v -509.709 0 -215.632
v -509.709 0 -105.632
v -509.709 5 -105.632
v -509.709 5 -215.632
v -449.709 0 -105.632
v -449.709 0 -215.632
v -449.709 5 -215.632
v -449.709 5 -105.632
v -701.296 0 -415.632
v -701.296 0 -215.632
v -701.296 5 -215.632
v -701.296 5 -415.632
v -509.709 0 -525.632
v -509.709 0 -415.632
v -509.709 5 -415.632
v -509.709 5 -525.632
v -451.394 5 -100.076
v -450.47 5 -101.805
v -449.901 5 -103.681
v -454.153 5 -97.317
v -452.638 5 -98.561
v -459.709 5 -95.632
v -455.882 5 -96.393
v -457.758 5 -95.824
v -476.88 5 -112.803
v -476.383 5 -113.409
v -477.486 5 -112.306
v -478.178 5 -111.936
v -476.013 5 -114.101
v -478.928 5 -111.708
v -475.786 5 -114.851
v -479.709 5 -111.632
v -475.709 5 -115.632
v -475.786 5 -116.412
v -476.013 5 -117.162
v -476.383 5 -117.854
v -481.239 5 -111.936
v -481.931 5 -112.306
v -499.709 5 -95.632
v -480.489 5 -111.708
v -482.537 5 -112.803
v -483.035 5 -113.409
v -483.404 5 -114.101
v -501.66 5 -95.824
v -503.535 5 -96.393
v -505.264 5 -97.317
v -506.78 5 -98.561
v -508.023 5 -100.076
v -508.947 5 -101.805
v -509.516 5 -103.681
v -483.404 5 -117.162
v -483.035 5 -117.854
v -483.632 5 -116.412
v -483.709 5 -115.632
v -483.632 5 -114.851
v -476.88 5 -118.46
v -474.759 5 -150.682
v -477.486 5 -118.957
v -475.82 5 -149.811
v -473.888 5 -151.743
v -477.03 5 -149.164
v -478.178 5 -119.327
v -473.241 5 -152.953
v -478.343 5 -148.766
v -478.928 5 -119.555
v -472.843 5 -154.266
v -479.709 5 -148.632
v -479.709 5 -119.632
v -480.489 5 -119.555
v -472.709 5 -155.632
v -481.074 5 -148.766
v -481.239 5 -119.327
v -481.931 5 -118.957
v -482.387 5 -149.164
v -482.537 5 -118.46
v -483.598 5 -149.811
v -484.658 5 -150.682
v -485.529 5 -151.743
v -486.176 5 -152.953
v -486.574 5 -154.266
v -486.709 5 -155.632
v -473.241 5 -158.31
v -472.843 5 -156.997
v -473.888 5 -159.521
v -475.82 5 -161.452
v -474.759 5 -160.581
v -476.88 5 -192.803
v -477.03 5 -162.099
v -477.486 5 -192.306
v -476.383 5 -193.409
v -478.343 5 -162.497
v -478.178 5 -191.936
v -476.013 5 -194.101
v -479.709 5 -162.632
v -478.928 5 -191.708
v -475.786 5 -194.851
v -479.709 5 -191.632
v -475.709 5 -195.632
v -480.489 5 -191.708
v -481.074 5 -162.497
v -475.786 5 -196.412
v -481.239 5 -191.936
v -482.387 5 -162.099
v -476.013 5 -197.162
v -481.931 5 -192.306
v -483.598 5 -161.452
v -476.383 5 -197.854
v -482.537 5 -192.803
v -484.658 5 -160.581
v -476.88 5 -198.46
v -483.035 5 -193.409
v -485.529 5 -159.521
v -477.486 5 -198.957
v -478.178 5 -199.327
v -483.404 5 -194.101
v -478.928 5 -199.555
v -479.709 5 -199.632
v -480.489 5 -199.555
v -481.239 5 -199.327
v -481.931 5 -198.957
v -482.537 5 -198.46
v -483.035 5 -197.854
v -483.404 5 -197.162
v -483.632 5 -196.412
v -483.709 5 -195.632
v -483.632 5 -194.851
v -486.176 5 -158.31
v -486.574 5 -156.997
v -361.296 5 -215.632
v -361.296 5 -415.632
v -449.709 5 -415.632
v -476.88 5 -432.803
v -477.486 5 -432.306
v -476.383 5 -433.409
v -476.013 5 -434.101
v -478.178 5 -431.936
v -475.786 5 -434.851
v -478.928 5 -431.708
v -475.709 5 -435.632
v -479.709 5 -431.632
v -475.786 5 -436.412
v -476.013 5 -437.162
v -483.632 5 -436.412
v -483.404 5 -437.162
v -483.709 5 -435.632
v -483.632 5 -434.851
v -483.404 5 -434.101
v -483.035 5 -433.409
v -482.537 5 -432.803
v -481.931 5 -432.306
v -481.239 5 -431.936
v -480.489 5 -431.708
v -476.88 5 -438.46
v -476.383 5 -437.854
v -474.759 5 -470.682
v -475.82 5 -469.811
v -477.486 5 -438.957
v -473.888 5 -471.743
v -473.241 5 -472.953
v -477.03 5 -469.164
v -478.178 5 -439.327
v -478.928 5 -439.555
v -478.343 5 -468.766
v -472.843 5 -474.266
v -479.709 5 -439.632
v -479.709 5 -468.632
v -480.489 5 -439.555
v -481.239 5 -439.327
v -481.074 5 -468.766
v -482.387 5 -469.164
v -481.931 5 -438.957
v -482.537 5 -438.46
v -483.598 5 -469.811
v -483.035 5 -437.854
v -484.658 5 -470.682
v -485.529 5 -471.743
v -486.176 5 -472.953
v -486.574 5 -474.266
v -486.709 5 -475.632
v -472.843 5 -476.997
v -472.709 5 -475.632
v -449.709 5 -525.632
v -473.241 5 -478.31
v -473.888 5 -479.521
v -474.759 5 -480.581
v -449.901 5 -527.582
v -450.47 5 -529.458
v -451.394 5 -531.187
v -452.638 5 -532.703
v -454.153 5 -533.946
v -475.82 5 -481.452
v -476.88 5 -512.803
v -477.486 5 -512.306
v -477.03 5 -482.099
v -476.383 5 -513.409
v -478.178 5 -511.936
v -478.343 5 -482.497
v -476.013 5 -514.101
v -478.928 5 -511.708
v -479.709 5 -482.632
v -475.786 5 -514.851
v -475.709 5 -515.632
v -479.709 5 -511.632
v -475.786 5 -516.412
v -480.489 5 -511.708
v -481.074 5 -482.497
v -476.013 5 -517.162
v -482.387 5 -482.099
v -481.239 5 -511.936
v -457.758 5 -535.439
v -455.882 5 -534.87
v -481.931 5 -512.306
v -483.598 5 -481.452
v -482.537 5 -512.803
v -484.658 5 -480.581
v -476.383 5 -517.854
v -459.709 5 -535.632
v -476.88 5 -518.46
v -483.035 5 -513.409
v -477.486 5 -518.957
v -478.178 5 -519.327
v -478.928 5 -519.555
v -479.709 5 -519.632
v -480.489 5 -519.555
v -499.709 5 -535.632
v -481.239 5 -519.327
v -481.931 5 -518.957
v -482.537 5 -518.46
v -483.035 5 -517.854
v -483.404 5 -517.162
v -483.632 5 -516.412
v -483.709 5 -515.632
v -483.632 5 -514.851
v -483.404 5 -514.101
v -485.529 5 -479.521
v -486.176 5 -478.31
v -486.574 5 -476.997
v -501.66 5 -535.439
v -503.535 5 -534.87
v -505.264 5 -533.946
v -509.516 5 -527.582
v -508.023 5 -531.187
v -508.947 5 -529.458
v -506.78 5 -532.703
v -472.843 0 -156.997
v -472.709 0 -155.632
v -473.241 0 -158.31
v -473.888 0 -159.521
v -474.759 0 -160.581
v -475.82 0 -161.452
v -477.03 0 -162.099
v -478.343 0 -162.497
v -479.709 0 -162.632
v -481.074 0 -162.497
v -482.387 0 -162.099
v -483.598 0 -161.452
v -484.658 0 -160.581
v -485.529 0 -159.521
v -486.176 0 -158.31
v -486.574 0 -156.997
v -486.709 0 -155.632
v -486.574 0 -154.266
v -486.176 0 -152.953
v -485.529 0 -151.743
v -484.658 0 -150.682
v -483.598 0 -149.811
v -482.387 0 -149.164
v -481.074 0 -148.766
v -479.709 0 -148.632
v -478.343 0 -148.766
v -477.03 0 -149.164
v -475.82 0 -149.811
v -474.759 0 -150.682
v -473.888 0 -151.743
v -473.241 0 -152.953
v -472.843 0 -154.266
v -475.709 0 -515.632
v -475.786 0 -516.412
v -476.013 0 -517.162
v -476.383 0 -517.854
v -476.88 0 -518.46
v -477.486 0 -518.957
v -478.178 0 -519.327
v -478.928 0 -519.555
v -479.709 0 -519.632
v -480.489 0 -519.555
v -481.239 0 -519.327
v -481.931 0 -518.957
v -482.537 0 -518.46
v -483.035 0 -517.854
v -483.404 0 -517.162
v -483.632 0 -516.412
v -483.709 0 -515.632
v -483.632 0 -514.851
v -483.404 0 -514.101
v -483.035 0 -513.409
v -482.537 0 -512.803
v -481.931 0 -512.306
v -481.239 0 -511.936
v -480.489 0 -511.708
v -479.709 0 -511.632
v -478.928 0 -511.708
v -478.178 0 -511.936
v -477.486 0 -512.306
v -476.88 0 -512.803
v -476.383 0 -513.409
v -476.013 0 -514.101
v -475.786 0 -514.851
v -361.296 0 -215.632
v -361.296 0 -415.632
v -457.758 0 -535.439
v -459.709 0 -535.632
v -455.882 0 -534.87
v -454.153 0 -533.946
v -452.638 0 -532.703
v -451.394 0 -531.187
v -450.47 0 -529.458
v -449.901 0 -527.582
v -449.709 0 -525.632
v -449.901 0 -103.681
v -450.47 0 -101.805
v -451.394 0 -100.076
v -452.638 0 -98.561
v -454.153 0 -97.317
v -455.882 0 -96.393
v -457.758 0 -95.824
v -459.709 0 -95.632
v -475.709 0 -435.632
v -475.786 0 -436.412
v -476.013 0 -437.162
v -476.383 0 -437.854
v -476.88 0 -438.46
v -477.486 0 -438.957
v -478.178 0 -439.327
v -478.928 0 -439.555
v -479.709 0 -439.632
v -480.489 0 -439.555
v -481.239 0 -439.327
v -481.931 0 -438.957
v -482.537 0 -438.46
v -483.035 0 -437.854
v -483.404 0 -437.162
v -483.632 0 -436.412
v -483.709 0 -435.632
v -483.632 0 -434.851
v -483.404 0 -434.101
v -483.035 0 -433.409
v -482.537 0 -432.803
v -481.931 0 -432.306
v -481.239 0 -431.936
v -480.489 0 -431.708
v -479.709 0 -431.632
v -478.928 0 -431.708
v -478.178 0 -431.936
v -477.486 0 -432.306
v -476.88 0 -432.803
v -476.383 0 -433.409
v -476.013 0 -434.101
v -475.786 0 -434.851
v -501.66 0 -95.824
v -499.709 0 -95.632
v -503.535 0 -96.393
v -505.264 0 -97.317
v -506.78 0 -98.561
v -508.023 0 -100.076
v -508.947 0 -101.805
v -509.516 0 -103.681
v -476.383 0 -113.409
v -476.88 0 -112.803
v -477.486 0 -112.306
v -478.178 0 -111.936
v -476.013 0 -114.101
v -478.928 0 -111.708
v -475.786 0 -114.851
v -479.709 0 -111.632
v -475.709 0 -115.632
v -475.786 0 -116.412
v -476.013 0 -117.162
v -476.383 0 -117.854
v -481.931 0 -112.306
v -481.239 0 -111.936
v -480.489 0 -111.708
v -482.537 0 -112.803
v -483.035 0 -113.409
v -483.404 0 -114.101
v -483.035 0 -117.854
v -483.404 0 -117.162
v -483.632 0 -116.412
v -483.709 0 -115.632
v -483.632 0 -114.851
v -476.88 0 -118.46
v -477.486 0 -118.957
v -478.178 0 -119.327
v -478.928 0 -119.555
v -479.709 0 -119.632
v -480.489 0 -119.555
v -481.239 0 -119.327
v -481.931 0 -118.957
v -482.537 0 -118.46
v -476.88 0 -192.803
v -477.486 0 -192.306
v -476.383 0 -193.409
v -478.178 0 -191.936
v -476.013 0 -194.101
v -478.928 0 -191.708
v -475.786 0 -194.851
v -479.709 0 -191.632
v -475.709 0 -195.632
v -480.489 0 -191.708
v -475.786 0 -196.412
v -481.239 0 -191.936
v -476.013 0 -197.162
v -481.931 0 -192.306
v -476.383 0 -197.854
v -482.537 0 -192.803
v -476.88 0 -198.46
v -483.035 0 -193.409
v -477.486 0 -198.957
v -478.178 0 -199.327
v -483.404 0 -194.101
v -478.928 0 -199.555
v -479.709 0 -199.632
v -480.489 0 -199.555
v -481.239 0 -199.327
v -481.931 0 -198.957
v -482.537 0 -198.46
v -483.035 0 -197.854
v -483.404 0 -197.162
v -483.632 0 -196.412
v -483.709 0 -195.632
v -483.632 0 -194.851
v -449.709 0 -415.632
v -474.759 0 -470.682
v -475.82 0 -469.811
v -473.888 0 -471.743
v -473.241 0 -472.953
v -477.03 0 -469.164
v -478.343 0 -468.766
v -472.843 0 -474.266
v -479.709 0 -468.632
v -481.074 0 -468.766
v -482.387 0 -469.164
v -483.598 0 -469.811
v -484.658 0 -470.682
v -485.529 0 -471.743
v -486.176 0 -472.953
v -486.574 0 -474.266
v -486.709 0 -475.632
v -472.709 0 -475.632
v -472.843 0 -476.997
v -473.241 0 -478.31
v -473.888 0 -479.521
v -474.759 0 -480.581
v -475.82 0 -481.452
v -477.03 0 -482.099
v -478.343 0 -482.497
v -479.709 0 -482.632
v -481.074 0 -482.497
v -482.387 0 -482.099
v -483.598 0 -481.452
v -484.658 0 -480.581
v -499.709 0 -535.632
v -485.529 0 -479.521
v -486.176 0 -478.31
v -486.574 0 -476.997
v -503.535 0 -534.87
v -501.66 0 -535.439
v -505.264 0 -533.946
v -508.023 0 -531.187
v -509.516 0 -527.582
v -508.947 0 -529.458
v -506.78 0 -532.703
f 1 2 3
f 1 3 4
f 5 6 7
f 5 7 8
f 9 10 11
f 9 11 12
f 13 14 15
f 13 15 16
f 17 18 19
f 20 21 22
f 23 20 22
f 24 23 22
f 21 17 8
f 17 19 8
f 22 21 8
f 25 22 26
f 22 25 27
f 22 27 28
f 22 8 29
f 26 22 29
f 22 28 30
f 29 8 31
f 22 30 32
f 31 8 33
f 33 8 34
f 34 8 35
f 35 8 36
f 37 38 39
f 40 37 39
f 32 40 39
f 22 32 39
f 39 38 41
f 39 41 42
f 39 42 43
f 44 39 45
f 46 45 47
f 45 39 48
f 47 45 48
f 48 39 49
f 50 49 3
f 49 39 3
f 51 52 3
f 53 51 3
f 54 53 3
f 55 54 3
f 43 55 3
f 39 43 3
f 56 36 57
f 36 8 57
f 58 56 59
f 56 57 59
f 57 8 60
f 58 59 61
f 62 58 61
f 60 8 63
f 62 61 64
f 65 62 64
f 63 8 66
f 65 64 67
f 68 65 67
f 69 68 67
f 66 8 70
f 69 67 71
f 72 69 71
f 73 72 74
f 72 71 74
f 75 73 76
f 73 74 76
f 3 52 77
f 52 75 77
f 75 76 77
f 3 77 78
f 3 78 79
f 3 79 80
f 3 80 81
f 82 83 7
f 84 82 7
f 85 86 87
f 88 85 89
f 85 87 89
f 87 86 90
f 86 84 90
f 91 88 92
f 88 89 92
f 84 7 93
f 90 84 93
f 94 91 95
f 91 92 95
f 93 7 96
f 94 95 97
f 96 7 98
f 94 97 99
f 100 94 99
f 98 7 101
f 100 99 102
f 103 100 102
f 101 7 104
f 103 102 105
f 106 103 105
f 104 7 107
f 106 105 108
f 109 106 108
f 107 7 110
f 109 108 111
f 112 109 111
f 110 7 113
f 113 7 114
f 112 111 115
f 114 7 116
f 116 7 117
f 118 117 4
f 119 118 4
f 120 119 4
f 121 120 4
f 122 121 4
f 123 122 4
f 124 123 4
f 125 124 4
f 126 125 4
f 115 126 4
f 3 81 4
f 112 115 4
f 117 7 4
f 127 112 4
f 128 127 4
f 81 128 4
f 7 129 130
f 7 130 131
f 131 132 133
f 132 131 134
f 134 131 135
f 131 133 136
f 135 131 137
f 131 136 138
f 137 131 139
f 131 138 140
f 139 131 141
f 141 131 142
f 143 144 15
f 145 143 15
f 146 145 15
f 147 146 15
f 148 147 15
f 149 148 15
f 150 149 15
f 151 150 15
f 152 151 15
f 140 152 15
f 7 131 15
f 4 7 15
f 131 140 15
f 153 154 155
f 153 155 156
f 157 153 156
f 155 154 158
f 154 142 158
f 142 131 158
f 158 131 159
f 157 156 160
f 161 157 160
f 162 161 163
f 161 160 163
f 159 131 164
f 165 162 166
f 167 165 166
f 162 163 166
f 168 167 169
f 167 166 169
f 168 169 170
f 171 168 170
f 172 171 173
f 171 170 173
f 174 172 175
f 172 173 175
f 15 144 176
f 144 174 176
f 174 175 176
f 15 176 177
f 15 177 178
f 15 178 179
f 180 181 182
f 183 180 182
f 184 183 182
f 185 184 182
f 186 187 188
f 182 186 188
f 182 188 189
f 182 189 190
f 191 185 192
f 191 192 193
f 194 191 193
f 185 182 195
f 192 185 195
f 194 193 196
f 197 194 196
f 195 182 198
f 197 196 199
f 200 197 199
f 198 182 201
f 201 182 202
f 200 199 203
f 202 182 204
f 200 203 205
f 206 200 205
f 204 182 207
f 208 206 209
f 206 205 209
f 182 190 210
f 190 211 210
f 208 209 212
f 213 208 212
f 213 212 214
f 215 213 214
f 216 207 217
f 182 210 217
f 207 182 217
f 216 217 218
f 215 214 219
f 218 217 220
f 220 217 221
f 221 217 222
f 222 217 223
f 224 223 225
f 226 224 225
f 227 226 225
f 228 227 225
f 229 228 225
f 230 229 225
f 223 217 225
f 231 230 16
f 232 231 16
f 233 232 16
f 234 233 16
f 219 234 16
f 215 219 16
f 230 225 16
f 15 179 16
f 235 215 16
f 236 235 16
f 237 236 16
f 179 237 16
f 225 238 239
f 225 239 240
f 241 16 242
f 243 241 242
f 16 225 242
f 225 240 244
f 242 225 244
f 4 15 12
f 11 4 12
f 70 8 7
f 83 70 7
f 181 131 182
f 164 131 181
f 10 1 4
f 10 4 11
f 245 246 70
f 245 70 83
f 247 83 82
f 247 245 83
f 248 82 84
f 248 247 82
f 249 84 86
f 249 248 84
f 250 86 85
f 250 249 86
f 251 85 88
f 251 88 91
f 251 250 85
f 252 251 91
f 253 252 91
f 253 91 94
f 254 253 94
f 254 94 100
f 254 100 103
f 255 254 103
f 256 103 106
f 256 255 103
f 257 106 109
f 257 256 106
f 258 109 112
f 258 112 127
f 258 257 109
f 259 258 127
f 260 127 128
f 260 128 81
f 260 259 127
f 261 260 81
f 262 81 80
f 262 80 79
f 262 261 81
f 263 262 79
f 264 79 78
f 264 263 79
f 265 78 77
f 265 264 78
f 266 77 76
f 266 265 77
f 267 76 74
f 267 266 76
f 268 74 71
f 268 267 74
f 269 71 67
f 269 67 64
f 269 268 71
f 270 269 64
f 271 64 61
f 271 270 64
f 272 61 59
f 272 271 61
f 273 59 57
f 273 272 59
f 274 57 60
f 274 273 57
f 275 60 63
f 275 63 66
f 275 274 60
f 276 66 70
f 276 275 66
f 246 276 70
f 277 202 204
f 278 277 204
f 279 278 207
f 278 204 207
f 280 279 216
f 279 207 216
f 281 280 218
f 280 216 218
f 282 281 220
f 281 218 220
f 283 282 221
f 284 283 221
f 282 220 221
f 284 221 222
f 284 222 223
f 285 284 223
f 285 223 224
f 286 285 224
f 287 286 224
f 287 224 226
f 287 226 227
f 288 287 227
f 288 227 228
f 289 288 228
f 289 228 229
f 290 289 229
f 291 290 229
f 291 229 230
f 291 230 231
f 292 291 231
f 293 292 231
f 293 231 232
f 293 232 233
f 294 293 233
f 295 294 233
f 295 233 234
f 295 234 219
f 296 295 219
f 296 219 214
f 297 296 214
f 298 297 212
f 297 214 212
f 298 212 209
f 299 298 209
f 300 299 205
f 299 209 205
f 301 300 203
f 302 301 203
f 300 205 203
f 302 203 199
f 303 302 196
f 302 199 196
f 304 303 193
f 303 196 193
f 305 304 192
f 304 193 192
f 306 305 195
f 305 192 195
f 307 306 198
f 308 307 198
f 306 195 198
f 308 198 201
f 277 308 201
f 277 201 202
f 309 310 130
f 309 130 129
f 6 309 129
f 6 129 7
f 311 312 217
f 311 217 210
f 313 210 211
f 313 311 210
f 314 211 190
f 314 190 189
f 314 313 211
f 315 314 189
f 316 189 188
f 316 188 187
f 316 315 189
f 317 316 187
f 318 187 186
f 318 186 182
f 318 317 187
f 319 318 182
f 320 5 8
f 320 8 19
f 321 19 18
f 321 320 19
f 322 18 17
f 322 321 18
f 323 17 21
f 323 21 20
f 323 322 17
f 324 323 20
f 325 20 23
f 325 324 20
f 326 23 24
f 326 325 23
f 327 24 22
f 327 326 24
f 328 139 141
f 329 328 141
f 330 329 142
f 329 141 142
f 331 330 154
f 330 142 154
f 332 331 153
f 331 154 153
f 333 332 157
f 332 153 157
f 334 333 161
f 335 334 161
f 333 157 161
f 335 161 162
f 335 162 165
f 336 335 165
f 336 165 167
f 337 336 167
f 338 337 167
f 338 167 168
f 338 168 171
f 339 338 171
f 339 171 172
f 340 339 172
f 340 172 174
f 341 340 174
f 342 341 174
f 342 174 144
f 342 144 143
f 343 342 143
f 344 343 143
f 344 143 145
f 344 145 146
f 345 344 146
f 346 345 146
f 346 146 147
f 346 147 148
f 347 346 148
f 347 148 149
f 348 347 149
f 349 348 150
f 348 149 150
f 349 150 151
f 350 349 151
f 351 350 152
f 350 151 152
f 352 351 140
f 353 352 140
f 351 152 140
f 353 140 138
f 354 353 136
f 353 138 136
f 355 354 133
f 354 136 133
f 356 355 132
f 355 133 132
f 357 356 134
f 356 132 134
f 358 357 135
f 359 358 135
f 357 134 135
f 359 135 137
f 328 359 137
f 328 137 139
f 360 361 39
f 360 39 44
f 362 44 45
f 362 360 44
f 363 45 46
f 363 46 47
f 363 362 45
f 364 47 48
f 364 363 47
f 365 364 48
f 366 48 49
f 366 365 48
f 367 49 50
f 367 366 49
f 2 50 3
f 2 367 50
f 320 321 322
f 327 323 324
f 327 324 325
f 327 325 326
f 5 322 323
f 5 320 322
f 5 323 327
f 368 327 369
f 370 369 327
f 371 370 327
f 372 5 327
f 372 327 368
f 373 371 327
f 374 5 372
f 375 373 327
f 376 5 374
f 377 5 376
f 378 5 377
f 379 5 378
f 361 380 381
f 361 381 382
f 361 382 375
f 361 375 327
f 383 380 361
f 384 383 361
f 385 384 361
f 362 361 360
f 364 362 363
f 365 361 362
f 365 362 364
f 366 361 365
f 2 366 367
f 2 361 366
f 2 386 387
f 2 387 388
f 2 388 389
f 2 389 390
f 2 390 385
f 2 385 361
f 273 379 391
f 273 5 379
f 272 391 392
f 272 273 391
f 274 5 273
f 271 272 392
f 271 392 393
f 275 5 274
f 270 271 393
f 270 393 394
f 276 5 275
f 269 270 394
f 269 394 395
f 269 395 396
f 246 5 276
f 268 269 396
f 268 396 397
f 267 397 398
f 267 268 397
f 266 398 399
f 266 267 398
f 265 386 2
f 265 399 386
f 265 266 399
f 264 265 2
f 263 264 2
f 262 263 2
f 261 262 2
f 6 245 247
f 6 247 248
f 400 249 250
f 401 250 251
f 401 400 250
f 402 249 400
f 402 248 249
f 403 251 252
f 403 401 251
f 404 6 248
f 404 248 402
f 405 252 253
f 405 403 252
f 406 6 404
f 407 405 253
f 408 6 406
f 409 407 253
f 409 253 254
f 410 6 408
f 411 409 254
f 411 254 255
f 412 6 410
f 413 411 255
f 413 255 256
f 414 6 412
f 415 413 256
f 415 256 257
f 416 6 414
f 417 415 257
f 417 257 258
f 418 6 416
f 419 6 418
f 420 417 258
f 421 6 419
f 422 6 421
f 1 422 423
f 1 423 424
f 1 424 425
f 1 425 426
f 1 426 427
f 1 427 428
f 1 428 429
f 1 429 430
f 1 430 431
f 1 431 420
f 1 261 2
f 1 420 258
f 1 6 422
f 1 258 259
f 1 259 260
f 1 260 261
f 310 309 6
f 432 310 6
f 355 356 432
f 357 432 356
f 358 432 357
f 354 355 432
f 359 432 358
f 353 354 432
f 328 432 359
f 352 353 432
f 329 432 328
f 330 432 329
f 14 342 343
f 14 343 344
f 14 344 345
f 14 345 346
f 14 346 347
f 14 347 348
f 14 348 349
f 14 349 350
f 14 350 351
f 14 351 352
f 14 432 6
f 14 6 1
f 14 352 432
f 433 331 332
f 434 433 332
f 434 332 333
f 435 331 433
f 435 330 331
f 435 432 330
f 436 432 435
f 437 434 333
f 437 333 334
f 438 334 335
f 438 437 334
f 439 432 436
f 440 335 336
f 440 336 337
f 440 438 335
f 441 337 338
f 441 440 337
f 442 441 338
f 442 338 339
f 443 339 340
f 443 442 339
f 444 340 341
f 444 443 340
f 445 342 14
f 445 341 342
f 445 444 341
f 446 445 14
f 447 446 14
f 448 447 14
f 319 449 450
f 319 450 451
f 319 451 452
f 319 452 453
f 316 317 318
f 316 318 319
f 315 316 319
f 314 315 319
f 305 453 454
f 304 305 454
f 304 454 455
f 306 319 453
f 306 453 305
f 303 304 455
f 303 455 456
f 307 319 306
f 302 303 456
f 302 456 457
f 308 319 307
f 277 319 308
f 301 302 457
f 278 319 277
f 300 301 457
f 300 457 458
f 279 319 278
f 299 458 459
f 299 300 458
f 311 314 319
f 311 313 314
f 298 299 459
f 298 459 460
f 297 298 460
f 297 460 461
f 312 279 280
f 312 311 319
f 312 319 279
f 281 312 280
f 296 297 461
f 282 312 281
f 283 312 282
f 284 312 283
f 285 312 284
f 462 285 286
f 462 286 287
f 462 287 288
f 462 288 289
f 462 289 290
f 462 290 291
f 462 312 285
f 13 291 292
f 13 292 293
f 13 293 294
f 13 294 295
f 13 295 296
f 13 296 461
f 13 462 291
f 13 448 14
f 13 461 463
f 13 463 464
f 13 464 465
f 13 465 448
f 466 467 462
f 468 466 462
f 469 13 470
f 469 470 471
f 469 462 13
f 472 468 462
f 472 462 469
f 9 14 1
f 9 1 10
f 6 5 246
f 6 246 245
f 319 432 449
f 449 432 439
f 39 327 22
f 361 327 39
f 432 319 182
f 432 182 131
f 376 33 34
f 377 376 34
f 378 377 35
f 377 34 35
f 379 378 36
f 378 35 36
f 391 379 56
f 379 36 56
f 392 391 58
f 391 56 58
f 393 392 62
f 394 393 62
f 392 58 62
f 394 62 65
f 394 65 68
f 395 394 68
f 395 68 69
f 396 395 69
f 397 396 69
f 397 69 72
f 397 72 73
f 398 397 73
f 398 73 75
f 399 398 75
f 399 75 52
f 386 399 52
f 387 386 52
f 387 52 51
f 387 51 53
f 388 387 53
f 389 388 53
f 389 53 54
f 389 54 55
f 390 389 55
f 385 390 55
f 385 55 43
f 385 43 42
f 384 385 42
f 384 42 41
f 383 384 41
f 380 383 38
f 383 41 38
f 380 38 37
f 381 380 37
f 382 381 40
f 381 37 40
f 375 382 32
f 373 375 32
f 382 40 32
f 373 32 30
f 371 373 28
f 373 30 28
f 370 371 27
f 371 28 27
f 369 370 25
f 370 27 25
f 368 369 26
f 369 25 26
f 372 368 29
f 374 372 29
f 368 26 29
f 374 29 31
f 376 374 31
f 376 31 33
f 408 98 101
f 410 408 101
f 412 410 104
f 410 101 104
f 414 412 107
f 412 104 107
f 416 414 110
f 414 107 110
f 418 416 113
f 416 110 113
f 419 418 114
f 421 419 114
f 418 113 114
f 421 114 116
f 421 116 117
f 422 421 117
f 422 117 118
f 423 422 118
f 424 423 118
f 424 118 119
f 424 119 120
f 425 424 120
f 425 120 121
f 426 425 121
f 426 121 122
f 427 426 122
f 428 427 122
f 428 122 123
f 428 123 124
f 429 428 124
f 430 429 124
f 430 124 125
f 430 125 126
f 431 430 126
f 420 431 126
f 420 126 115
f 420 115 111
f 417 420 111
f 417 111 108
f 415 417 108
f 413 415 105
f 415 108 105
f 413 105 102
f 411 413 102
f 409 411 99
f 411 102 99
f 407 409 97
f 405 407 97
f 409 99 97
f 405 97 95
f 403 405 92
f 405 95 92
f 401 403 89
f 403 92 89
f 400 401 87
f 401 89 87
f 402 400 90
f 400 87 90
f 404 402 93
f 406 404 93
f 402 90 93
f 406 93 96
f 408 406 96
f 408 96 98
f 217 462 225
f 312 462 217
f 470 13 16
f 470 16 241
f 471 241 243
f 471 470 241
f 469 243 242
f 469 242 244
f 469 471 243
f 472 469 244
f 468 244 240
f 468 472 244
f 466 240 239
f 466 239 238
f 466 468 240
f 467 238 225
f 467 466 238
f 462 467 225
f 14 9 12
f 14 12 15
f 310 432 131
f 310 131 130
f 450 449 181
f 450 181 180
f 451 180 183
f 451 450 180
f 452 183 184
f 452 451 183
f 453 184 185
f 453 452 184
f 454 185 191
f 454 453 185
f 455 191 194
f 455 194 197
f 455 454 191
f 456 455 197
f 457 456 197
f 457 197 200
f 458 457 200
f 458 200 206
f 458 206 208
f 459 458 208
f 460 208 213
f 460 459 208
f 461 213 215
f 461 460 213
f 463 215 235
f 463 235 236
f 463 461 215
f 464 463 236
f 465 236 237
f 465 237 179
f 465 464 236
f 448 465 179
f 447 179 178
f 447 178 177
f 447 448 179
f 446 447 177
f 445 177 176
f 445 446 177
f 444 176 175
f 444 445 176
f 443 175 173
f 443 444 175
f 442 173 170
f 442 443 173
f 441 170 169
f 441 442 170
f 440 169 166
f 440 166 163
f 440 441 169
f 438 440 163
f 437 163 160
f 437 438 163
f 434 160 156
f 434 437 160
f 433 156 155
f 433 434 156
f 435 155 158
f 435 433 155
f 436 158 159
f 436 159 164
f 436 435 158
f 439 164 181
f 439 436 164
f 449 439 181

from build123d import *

# Parameters (mm, degrees)
SKETCH1_R           = 7
BOSS_EXTRUDE1_DEPTH = 5
SKETCH2_R           = 4
CUT_EXTRUDE1_DEPTH  = 6


with BuildPart() as part:
    # Sketch1 → Boss-Extrude1 (new body)
    with BuildSketch(Plane(origin=(0, 0, 0), x_dir=(1, 0, 0), z_dir=(0, 1, 0))):
        with BuildLine():
            Line((-449.708642176, 415.631578947), (-361.296475424, 415.631578947))
            Line((-361.296475424, 415.631578947), (-361.296475424, 215.631578947))
            Line((-361.296475424, 215.631578947), (-449.708642176, 215.631578947))
            Line((-449.708642176, 215.631578947), (-449.708642176, 105.631578947))
            ThreePointArc((-449.708642176, 105.631578947), (-452.637574364, 98.560511136), (-459.708642176, 95.631578947))
            Line((-459.708642176, 95.631578947), (-499.708642176, 95.631578947))
            ThreePointArc((-499.708642176, 95.631578947), (-506.779709988, 98.560511136), (-509.708642176, 105.631578947))
            Line((-509.708642176, 105.631578947), (-509.708642176, 215.631578947))
            Line((-509.708642176, 215.631578947), (-701.296475424, 215.631578947))
            Line((-701.296475424, 215.631578947), (-701.296475424, 415.631578947))
            Line((-701.296475424, 415.631578947), (-509.708642176, 415.631578947))
            Line((-509.708642176, 415.631578947), (-509.708642176, 525.631578947))
            ThreePointArc((-509.708642176, 525.631578947), (-506.779709988, 532.702646759), (-499.708642176, 535.631578947))
            Line((-499.708642176, 535.631578947), (-459.708642176, 535.631578947))
            ThreePointArc((-459.708642176, 535.631578947), (-452.637574364, 532.702646759), (-449.708642176, 525.631578947))
            Line((-449.708642176, 525.631578947), (-449.708642176, 415.631578947))
        make_face()
        with Locations((-479.708642176, 475.631578947)):
            Circle(SKETCH1_R, mode=Mode.SUBTRACT)
        with Locations((-479.708642176, 155.631578947)):
            Circle(SKETCH1_R, mode=Mode.SUBTRACT)
    extrude(amount=BOSS_EXTRUDE1_DEPTH)

    # Sketch2 → Cut-Extrude1 (cut, through all)
    with BuildSketch(Plane(origin=(0, 5, 0), x_dir=(1, 0, 0), z_dir=(0, 1, 0))):
        with Locations((-479.708642176, 195.631578947)):
            Circle(SKETCH2_R)
        with Locations((-479.708642176, 115.631578947)):
            Circle(SKETCH2_R)
        with Locations((-479.708642176, 515.631578947)):
            Circle(SKETCH2_R)
        with Locations((-479.708642176, 435.631578947)):
            Circle(SKETCH2_R)
    extrude(amount=-CUT_EXTRUDE1_DEPTH, mode=Mode.SUBTRACT)


solid = part.part
